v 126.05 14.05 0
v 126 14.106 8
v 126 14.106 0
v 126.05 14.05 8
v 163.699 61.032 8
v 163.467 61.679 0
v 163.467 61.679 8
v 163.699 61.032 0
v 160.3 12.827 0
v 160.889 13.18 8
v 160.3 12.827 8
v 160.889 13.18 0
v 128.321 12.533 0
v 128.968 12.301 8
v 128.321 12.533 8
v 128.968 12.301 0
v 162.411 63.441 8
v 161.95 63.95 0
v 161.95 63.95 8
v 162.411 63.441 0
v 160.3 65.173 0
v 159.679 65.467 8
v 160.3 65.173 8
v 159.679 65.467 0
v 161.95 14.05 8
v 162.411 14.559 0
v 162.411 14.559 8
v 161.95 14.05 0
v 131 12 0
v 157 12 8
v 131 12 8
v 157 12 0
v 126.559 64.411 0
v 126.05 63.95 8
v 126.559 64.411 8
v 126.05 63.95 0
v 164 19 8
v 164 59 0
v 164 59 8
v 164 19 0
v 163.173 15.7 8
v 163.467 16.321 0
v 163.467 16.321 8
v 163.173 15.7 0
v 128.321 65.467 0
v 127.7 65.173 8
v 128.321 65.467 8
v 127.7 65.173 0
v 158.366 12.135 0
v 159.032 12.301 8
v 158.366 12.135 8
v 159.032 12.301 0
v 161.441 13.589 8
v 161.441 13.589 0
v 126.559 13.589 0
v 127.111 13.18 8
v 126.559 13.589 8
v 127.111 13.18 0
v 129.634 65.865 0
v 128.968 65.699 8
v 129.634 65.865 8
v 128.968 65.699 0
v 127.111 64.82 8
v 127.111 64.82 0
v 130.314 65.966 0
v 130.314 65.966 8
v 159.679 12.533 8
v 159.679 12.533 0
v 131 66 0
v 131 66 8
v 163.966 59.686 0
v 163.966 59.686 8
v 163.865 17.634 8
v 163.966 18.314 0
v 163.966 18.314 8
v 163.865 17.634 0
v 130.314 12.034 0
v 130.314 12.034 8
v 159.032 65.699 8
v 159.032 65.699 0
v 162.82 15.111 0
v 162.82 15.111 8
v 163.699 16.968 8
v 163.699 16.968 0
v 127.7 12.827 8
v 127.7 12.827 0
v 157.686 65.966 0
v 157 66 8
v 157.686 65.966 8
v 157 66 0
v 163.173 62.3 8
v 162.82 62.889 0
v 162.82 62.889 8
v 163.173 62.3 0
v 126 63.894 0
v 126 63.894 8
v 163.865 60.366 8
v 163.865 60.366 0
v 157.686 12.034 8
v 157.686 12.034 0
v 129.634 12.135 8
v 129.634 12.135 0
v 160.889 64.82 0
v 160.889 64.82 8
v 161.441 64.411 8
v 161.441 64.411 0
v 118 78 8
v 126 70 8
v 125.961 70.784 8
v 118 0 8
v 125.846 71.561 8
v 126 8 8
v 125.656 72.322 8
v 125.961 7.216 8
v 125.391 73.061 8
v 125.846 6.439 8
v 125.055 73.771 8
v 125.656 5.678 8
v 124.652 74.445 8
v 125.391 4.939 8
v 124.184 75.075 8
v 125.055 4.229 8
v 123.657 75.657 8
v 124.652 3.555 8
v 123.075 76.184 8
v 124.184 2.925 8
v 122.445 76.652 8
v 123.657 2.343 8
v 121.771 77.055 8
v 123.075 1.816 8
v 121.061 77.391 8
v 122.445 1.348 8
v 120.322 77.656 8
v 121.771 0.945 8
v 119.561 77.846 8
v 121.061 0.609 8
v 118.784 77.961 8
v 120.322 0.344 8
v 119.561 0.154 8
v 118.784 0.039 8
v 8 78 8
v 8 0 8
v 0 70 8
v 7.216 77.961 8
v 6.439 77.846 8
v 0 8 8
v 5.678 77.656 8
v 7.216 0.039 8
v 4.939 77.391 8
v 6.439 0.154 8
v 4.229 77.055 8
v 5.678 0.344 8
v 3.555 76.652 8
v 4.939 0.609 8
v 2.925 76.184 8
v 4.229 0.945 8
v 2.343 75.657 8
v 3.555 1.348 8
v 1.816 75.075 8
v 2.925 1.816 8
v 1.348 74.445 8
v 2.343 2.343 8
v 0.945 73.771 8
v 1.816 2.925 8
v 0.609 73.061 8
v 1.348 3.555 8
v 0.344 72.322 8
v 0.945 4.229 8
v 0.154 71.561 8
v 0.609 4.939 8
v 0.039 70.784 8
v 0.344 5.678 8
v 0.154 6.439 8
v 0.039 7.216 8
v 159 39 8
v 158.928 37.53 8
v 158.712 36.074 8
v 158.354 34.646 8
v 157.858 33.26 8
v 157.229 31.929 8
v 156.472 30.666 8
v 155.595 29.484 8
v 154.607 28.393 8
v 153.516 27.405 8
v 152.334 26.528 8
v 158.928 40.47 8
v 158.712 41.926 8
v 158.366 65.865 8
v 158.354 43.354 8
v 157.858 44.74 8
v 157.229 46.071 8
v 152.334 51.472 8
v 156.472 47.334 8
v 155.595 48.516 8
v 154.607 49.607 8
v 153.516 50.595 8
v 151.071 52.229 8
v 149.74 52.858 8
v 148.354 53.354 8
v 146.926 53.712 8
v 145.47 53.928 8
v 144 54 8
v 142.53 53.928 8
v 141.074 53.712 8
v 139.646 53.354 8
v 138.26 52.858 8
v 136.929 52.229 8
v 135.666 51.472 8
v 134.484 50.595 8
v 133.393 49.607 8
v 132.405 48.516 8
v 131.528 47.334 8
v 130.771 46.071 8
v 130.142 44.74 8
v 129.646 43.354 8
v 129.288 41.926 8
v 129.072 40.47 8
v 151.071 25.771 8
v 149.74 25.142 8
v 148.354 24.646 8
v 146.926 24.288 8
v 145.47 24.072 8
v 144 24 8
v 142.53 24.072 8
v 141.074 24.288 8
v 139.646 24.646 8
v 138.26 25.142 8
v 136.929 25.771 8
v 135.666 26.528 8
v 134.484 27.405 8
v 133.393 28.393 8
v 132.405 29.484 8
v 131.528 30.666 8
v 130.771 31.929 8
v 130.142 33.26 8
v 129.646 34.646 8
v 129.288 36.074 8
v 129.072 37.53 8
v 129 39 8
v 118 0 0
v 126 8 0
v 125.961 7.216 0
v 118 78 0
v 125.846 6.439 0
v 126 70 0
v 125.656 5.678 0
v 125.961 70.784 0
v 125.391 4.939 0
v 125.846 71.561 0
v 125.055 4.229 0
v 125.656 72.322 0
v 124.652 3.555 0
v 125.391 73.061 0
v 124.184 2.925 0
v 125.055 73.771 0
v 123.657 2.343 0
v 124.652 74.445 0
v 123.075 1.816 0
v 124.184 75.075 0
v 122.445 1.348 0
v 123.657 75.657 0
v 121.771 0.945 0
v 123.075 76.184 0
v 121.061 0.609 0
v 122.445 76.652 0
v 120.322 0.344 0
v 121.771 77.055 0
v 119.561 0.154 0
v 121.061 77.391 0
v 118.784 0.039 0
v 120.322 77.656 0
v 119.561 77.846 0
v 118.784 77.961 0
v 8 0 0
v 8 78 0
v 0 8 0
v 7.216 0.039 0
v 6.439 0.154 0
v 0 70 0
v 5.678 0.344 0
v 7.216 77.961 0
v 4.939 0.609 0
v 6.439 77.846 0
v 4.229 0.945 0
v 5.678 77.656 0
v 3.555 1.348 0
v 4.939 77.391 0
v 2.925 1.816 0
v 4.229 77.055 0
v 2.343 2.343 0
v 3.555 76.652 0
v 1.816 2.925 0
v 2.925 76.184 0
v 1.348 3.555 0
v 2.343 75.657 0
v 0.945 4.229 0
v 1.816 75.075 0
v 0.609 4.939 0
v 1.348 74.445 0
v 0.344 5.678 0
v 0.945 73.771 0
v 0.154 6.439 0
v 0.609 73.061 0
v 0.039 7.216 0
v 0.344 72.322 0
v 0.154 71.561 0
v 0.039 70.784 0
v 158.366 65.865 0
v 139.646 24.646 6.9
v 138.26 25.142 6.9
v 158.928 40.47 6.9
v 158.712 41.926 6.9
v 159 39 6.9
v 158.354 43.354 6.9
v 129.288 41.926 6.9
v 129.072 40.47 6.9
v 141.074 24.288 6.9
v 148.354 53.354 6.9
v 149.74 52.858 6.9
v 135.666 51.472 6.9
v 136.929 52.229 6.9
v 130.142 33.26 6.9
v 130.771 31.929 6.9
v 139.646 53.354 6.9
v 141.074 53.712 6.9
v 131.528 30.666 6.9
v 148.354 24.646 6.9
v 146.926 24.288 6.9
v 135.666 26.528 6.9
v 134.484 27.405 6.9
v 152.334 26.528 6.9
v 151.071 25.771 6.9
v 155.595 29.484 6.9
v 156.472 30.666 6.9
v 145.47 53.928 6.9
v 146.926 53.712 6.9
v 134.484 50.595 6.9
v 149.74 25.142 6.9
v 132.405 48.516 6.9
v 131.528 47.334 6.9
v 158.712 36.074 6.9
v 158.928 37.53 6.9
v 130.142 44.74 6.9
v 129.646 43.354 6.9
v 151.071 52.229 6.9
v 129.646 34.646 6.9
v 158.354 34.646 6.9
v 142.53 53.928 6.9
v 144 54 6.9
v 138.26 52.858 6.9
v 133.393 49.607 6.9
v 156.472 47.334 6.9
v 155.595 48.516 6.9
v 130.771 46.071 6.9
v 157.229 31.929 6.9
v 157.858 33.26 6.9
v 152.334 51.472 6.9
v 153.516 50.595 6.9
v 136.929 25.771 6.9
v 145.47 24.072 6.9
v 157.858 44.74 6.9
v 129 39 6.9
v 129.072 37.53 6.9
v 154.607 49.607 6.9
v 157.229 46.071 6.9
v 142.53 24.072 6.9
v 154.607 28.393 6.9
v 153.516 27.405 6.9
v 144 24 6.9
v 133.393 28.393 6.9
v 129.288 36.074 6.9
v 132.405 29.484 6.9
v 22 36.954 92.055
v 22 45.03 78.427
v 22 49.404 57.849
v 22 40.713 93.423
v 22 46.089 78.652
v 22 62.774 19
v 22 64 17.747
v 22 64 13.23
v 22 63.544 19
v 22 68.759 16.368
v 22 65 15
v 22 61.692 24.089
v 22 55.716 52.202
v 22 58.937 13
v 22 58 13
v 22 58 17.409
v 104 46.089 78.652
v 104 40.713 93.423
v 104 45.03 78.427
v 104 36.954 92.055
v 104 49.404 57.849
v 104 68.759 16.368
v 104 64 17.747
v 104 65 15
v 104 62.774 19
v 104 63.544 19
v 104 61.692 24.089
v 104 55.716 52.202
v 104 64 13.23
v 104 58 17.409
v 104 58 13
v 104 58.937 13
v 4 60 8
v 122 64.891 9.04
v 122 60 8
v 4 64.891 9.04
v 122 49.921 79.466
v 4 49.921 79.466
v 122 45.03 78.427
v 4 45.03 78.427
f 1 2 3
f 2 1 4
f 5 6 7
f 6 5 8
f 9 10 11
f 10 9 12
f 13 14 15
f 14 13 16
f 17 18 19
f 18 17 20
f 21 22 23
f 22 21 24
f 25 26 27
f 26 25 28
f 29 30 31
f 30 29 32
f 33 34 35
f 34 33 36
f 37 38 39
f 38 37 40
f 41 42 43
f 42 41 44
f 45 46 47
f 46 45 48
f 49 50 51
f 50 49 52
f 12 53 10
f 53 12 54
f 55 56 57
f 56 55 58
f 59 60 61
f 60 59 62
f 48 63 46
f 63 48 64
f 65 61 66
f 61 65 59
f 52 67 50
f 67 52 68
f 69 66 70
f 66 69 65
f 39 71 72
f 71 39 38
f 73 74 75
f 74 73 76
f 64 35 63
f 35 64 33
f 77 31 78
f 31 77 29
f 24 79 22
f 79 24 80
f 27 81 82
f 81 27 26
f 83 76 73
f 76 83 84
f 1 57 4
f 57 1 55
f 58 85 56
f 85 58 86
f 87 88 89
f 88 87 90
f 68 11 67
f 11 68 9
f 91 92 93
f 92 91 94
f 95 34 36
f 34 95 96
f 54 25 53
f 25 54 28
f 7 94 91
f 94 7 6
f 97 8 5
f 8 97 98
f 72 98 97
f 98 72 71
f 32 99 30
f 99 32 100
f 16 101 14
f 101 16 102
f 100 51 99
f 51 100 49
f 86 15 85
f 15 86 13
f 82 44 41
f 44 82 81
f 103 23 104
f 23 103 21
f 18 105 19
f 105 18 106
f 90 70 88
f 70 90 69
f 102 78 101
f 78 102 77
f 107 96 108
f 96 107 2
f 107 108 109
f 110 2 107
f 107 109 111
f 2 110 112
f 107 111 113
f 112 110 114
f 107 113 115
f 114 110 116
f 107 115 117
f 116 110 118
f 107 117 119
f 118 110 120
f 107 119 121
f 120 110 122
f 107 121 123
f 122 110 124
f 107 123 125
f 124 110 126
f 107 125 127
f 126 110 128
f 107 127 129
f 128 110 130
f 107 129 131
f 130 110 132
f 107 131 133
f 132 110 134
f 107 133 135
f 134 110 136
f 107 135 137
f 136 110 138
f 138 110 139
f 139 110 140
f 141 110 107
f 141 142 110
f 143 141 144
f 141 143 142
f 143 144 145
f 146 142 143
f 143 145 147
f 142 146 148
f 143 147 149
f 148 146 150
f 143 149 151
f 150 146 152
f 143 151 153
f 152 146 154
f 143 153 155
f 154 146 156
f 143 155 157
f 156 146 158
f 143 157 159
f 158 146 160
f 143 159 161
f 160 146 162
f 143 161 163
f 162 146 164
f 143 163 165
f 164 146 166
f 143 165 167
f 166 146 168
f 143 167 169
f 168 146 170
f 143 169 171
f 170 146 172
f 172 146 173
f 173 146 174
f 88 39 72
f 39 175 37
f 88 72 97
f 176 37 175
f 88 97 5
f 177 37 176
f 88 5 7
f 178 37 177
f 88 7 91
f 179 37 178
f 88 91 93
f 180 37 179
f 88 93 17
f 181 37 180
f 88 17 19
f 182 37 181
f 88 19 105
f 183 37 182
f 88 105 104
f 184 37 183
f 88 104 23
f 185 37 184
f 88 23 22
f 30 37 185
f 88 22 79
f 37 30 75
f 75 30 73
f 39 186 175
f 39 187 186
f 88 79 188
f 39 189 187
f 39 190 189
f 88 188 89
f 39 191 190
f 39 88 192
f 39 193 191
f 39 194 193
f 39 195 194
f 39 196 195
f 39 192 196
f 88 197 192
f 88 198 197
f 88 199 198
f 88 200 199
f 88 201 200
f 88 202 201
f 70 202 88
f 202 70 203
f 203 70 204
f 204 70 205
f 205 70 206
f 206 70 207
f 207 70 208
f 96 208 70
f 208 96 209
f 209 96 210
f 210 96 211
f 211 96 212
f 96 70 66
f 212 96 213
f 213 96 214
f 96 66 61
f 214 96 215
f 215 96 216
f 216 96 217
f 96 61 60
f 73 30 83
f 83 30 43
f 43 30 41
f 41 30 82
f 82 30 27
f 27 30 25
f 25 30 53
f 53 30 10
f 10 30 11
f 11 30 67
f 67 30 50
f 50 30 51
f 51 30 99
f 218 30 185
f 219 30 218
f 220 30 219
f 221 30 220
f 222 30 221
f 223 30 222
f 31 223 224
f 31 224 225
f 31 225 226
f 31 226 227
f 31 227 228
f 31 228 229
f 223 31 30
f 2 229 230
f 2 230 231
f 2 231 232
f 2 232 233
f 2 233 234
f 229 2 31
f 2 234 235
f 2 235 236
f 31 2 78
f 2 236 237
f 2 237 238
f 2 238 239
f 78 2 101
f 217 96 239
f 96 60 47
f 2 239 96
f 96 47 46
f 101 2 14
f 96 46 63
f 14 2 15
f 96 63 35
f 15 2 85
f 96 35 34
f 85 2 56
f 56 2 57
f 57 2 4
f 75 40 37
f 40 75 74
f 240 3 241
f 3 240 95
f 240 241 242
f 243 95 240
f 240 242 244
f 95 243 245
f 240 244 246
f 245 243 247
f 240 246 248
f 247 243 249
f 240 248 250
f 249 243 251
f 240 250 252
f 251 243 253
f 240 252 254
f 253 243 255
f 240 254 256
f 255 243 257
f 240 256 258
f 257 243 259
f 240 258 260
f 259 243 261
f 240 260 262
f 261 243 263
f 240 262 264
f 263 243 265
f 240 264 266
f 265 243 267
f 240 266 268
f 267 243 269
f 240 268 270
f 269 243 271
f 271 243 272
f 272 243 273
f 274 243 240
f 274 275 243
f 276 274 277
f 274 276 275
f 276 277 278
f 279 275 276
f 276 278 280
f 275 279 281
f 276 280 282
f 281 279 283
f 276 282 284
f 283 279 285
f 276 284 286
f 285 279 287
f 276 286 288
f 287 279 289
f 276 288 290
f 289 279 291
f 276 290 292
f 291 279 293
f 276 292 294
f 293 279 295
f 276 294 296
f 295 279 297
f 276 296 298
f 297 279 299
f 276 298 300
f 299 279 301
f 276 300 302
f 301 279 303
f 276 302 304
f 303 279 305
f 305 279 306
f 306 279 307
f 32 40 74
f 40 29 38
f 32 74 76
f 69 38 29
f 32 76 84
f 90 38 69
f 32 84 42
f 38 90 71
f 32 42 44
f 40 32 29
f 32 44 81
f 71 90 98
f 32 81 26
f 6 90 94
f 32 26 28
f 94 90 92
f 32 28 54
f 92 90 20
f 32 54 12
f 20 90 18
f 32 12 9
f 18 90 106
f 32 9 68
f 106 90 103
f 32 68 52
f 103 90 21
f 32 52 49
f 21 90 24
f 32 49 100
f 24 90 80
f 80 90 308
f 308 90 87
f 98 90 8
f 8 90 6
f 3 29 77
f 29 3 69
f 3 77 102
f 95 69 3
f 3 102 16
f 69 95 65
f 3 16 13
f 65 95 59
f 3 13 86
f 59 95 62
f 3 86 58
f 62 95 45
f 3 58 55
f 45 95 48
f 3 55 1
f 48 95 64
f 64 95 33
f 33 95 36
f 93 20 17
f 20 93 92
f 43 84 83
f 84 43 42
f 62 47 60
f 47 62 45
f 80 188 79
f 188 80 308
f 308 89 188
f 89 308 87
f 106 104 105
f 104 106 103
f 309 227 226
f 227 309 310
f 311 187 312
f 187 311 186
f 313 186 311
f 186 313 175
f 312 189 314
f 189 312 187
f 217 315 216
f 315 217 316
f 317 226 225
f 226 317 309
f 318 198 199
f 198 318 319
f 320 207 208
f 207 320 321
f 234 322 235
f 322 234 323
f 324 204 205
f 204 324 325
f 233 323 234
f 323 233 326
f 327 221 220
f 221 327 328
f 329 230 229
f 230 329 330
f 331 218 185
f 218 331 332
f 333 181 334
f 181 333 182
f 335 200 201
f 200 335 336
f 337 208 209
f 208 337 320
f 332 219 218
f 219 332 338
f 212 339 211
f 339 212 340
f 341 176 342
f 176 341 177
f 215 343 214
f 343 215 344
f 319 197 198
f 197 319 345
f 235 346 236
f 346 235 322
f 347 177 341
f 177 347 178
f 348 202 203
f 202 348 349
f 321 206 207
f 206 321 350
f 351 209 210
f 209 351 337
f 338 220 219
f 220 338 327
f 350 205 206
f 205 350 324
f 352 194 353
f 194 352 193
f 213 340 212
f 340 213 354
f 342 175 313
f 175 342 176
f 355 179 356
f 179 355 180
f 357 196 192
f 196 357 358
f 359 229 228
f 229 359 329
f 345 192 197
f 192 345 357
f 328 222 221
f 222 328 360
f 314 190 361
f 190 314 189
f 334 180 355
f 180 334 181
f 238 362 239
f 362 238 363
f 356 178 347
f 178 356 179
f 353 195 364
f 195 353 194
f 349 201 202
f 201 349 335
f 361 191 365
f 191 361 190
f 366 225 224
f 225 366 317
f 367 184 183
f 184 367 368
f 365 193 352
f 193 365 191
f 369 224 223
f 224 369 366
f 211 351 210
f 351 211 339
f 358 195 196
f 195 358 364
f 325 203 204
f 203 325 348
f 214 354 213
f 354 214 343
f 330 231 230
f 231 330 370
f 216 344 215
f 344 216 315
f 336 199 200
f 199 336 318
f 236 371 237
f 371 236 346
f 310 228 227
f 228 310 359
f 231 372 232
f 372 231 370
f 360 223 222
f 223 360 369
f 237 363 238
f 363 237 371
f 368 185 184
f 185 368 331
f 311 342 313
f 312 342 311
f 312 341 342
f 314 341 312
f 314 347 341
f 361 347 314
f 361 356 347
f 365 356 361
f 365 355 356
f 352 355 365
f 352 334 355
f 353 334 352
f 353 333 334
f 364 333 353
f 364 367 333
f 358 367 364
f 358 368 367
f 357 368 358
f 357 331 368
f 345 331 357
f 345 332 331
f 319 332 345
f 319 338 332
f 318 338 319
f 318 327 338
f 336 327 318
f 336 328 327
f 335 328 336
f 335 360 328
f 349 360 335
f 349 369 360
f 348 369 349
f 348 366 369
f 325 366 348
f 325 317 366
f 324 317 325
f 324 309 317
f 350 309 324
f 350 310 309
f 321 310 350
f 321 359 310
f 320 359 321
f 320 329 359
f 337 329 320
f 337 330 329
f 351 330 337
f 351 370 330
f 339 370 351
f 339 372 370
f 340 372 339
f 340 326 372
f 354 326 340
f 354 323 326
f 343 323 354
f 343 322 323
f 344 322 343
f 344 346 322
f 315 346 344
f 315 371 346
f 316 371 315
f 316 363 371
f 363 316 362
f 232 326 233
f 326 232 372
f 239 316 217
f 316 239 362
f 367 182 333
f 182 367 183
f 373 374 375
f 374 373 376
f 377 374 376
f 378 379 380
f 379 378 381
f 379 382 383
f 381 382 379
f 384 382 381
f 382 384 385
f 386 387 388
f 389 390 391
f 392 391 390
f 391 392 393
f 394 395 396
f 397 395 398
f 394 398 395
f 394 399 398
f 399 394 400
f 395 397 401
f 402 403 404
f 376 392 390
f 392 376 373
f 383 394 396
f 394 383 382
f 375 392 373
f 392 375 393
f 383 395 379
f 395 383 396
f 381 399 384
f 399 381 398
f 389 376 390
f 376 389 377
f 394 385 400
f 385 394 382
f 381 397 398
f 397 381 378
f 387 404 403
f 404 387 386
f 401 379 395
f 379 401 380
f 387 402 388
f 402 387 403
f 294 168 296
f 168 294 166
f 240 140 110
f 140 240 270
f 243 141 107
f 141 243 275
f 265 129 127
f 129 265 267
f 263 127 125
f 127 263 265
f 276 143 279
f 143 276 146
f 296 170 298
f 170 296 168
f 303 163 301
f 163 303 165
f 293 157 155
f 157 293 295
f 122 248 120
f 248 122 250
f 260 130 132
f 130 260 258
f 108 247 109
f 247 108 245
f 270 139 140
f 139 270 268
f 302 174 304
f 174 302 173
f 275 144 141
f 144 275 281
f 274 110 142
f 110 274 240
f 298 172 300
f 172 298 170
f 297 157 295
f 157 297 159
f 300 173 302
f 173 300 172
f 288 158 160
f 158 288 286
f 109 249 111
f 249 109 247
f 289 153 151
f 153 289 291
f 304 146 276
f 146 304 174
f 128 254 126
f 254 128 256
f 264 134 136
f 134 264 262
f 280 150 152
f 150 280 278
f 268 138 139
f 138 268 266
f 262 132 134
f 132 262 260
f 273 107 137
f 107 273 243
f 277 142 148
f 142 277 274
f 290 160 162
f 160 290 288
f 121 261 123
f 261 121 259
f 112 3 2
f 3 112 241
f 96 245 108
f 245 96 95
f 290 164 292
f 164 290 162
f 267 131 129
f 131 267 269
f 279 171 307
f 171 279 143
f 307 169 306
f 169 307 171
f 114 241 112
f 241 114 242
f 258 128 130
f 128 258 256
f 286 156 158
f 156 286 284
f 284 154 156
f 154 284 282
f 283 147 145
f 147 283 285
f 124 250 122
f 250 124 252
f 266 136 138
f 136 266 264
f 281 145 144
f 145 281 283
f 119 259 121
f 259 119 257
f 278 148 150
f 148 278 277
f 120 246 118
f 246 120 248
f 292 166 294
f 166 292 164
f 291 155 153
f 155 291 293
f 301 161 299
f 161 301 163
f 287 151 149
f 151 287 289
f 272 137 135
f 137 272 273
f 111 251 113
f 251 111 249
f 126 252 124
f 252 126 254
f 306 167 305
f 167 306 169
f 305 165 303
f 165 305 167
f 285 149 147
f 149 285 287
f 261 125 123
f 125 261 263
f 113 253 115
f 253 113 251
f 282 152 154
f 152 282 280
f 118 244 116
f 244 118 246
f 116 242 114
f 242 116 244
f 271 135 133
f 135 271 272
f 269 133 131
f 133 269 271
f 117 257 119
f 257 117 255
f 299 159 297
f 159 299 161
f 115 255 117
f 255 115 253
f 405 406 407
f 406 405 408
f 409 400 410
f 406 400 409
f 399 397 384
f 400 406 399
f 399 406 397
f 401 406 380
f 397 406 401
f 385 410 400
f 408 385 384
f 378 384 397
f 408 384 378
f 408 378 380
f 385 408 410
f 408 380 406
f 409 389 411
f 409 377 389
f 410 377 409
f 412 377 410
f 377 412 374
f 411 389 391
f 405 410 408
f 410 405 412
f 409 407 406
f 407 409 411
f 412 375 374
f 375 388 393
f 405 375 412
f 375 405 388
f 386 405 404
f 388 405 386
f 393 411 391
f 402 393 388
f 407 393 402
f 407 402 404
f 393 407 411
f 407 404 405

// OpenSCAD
// PokéDock V4 compact concept
// No front tray. Rear sloped phone support. Side NFC pod.
// Dimensions are design targets; verify against physical HMI/phone/Qi puck before printing.
$fn=64;

BASE_W = 126;
BASE_D = 78;
BASE_H = 8;
CORNER = 8;

SCREEN_W = 118;
SCREEN_PLATE_T = 5;
SCREEN_TILT = 12;

PHONE_SUPPORT_W = 82;
PHONE_SUPPORT_H = 82;
PHONE_SUPPORT_T = 4;
PHONE_ANGLE = 70;  // from horizontal

NFC_SIDE = "right"; // "left" or "right"
NFC_POD_W = 40;
NFC_POD_D = 54;
NFC_POD_H = 8;
NFC_RECESS_D = 30;

module rbox(w,d,h,r=5){
  hull() for(x=[r,w-r]) for(y=[r,d-r]) translate([x,y,0]) cylinder(h=h,r=r);
}

module main_base(){
  rbox(BASE_W, BASE_D, BASE_H, CORNER);
}

module nfc_pod(){
  x = (NFC_SIDE=="right") ? BASE_W-2 : -NFC_POD_W+2;
  translate([x, 12, 0])
    difference(){
      rbox(NFC_POD_W, NFC_POD_D, NFC_POD_H, 7);
      translate([NFC_POD_W/2, NFC_POD_D/2, NFC_POD_H-1.1])
        cylinder(h=2,d=NFC_RECESS_D);
    }
}

module screen_support(){
  translate([(BASE_W-SCREEN_W)/2, BASE_D-18, BASE_H])
    rotate([SCREEN_TILT,0,0])
      cube([SCREEN_W, SCREEN_PLATE_T, 72]);
}

module rear_phone_slope(){
  // A simple ramp, not a deep slot.
  translate([(BASE_W-PHONE_SUPPORT_W)/2, BASE_D-13, BASE_H+7])
    rotate([90-PHONE_ANGLE,0,0])
      cube([PHONE_SUPPORT_W, PHONE_SUPPORT_T, PHONE_SUPPORT_H]);

  // Minimal bottom stop only.
  translate([(BASE_W-PHONE_SUPPORT_W)/2, BASE_D-20, BASE_H+5])
    cube([PHONE_SUPPORT_W, 6, 6]);
}

union(){
  main_base();
  nfc_pod();
  screen_support();
  rear_phone_slope();
}

// Keep Qi puck removable on the rear support.
// Do not permanently encapsulate charging electronics.
